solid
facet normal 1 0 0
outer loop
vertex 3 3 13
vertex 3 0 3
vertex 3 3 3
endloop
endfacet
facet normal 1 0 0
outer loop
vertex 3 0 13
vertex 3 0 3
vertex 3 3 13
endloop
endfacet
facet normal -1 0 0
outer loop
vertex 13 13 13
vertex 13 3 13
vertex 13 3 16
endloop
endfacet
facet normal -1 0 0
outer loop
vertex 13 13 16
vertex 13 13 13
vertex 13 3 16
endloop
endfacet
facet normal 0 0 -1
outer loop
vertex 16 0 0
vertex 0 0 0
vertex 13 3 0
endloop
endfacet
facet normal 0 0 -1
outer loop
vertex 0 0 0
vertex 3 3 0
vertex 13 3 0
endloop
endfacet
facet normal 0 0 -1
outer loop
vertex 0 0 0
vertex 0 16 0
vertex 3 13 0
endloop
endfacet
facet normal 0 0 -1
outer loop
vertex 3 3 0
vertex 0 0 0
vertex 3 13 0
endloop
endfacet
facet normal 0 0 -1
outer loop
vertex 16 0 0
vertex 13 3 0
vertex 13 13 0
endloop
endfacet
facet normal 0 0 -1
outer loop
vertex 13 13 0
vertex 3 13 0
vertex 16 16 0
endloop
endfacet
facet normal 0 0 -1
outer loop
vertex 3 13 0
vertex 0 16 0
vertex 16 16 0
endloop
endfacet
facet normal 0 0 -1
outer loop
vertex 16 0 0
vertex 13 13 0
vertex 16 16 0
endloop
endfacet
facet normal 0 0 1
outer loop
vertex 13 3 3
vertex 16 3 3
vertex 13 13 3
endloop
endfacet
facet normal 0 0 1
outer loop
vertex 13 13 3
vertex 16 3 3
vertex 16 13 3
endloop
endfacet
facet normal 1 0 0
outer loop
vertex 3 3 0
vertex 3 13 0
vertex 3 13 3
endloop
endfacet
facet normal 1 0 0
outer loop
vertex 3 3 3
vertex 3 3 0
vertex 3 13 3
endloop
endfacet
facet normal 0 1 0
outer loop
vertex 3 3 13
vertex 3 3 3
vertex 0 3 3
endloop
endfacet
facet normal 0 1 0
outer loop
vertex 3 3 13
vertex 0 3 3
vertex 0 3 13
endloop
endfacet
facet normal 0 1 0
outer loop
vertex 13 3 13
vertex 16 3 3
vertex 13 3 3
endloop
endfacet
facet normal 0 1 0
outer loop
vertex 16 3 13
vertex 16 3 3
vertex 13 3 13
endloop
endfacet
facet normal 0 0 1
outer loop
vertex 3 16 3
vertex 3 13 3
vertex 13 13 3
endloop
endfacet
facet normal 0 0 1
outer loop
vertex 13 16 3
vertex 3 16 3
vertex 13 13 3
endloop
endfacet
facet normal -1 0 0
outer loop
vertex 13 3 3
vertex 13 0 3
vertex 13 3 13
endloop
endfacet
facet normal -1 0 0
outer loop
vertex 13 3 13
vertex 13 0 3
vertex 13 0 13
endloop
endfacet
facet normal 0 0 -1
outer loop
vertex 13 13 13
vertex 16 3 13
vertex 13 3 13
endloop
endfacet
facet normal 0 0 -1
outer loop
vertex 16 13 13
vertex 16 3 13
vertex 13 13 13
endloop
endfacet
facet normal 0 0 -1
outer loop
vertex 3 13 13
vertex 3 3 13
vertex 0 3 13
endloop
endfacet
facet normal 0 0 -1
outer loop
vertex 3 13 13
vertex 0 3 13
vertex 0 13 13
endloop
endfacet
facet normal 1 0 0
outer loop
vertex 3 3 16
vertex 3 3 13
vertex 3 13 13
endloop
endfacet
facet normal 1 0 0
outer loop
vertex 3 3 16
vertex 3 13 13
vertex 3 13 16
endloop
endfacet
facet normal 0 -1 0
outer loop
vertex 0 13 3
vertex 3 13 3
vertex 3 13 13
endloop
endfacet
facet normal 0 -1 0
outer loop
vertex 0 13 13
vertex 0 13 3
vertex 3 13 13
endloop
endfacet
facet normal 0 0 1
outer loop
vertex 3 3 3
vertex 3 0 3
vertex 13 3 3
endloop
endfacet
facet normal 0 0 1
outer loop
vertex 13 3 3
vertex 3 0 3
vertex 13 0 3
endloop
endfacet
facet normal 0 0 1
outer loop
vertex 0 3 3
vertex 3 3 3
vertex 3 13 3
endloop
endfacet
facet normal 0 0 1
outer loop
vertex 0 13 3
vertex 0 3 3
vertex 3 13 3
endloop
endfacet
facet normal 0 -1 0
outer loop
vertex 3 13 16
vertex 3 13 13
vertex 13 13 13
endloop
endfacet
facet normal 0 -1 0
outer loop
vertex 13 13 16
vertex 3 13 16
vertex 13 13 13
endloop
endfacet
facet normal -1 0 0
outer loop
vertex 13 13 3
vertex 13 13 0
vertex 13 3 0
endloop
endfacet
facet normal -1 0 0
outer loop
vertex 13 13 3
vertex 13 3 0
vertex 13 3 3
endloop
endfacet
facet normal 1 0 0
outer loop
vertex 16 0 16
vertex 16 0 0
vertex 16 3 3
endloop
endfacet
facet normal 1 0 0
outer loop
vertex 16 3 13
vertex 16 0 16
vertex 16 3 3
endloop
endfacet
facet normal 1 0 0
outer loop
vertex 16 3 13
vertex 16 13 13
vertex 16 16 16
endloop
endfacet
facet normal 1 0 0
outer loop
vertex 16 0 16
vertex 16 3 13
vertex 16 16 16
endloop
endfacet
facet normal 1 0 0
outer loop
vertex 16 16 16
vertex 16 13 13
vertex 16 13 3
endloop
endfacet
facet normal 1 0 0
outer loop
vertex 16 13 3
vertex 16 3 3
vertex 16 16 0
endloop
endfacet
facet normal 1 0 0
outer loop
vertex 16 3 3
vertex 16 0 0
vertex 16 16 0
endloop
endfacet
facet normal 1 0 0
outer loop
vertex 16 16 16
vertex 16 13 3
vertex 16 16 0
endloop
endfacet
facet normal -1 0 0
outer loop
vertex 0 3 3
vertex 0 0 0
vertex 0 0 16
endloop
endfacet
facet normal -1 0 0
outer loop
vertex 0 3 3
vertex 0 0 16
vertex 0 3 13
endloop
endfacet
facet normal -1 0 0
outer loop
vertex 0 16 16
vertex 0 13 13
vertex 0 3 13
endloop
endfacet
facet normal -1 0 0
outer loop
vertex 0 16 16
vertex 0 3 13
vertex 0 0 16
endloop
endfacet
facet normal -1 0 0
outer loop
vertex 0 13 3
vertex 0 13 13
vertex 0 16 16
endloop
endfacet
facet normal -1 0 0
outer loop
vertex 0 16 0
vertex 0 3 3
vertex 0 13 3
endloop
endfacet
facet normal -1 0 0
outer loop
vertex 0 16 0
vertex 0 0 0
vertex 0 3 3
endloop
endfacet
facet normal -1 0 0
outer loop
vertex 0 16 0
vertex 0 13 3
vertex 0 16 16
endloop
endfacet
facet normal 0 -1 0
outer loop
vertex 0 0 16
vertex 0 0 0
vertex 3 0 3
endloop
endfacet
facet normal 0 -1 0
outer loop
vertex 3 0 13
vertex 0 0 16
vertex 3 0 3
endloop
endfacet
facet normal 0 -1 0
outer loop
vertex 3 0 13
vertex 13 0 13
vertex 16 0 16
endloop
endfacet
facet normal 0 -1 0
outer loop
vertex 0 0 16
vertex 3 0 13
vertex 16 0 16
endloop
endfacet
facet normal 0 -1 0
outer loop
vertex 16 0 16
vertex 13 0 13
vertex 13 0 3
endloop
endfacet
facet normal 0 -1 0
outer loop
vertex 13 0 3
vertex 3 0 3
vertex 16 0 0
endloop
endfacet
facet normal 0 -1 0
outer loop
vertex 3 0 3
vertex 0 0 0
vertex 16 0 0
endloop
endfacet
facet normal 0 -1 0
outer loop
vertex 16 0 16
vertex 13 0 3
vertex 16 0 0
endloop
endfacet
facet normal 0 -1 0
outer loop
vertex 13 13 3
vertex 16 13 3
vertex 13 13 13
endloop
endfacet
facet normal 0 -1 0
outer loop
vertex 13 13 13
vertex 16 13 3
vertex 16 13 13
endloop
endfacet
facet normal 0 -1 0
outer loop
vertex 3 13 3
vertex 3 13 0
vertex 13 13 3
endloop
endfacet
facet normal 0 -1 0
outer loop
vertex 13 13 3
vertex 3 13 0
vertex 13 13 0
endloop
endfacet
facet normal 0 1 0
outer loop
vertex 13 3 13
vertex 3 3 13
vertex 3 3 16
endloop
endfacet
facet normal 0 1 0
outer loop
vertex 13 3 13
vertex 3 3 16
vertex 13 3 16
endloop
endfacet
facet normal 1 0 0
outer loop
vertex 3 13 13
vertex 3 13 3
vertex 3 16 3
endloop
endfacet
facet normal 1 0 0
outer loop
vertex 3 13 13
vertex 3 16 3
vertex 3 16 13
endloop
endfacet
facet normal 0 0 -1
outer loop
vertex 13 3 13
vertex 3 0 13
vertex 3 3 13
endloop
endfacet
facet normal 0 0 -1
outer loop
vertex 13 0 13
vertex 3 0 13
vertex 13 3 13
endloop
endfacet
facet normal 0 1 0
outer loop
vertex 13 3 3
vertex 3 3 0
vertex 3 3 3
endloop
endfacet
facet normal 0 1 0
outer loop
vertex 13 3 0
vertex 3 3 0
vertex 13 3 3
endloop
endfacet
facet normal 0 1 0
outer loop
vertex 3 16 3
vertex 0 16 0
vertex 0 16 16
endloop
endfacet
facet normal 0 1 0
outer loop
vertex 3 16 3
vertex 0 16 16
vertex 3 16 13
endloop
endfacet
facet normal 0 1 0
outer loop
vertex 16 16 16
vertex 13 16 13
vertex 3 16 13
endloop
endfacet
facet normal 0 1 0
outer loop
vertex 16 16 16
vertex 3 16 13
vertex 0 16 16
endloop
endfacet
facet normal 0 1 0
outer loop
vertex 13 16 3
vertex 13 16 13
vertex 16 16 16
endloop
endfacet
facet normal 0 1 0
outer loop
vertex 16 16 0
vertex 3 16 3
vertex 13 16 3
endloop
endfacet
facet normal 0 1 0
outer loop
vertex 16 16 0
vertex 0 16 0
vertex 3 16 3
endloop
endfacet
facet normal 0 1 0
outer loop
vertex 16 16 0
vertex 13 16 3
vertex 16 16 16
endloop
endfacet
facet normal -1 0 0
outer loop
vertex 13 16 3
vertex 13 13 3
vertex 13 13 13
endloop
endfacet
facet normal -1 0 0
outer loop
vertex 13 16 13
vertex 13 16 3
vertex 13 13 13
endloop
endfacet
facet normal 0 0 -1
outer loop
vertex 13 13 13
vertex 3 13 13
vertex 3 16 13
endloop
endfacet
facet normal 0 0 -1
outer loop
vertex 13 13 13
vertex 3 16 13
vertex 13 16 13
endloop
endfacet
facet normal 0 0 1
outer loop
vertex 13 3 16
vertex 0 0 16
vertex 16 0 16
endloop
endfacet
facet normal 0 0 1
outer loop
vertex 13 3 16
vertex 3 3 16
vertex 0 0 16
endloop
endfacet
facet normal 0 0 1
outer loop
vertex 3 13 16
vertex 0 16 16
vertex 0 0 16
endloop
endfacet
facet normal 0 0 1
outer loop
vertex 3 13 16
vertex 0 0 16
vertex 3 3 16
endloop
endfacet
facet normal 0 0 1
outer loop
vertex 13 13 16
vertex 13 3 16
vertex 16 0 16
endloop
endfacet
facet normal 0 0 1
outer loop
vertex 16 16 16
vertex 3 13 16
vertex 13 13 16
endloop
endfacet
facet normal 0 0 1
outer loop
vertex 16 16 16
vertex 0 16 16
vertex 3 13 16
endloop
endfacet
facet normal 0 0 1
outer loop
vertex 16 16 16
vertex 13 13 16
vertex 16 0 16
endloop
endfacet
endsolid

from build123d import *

# Parameters (mm, degrees)
F0_W     = 16
F0_H     = 16
F0_W_2   = 10
F0_H_2   = 10
F1_DEPTH = 16
F2_W     = 10
F2_H     = 10
F3_DEPTH = 25
F4_W     = 10
F4_H     = 10
F5_DEPTH = 25


with BuildPart() as f1:
    # F0 (on Top) → F1 (new body)
    with BuildSketch(Plane.XY):
        with Locations((8, 8)):
            Rectangle(F0_W, F0_H)
        with Locations((8, 8)):
            Rectangle(F0_W_2, F0_H_2, mode=Mode.SUBTRACT)
    extrude(amount=F1_DEPTH)

    # F2 (on face) → F3 (cut)
    with BuildSketch(Plane.XZ):
        with Locations((8, 8)):
            Rectangle(F2_W, F2_H)
    extrude(amount=-F3_DEPTH, mode=Mode.SUBTRACT)

    # F4 (on face) → F5 (cut)
    with BuildSketch(Plane.YZ.offset(16)):
        with Locations((8, 8)):
            Rectangle(F4_W, F4_H)
    extrude(amount=-F5_DEPTH, mode=Mode.SUBTRACT)


solid = f1.part
